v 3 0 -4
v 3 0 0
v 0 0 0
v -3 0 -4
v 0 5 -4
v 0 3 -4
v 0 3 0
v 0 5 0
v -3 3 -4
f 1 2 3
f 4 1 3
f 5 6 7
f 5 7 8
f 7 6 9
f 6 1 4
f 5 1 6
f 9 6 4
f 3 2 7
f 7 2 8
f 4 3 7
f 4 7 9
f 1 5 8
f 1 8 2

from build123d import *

# Parameters (mm, degrees)
BOSS_EXTRUDE1_DEPTH = 3
BOSS_EXTRUDE2_DEPTH = 4


with BuildPart() as part:
    # Sketch1 → Boss-Extrude1 (new body)
    with BuildSketch(Plane(origin=(0, 0, 0), x_dir=(1, 0, 0), z_dir=(0, 1, 0))):
        Polygon((0, 0), (-3, 4), (0, 4), align=None)
    extrude(amount=BOSS_EXTRUDE1_DEPTH)

    # Sketch2 → Boss-Extrude2 (add)
    with BuildSketch(Plane(origin=(0, 0, -4), x_dir=(-1, 0, 0), z_dir=(0, 0, -1))):
        Polygon((0, 5), (-3, 0), (0, 0), (0, 3), align=None)
    extrude(amount=-BOSS_EXTRUDE2_DEPTH)


solid = part.part
